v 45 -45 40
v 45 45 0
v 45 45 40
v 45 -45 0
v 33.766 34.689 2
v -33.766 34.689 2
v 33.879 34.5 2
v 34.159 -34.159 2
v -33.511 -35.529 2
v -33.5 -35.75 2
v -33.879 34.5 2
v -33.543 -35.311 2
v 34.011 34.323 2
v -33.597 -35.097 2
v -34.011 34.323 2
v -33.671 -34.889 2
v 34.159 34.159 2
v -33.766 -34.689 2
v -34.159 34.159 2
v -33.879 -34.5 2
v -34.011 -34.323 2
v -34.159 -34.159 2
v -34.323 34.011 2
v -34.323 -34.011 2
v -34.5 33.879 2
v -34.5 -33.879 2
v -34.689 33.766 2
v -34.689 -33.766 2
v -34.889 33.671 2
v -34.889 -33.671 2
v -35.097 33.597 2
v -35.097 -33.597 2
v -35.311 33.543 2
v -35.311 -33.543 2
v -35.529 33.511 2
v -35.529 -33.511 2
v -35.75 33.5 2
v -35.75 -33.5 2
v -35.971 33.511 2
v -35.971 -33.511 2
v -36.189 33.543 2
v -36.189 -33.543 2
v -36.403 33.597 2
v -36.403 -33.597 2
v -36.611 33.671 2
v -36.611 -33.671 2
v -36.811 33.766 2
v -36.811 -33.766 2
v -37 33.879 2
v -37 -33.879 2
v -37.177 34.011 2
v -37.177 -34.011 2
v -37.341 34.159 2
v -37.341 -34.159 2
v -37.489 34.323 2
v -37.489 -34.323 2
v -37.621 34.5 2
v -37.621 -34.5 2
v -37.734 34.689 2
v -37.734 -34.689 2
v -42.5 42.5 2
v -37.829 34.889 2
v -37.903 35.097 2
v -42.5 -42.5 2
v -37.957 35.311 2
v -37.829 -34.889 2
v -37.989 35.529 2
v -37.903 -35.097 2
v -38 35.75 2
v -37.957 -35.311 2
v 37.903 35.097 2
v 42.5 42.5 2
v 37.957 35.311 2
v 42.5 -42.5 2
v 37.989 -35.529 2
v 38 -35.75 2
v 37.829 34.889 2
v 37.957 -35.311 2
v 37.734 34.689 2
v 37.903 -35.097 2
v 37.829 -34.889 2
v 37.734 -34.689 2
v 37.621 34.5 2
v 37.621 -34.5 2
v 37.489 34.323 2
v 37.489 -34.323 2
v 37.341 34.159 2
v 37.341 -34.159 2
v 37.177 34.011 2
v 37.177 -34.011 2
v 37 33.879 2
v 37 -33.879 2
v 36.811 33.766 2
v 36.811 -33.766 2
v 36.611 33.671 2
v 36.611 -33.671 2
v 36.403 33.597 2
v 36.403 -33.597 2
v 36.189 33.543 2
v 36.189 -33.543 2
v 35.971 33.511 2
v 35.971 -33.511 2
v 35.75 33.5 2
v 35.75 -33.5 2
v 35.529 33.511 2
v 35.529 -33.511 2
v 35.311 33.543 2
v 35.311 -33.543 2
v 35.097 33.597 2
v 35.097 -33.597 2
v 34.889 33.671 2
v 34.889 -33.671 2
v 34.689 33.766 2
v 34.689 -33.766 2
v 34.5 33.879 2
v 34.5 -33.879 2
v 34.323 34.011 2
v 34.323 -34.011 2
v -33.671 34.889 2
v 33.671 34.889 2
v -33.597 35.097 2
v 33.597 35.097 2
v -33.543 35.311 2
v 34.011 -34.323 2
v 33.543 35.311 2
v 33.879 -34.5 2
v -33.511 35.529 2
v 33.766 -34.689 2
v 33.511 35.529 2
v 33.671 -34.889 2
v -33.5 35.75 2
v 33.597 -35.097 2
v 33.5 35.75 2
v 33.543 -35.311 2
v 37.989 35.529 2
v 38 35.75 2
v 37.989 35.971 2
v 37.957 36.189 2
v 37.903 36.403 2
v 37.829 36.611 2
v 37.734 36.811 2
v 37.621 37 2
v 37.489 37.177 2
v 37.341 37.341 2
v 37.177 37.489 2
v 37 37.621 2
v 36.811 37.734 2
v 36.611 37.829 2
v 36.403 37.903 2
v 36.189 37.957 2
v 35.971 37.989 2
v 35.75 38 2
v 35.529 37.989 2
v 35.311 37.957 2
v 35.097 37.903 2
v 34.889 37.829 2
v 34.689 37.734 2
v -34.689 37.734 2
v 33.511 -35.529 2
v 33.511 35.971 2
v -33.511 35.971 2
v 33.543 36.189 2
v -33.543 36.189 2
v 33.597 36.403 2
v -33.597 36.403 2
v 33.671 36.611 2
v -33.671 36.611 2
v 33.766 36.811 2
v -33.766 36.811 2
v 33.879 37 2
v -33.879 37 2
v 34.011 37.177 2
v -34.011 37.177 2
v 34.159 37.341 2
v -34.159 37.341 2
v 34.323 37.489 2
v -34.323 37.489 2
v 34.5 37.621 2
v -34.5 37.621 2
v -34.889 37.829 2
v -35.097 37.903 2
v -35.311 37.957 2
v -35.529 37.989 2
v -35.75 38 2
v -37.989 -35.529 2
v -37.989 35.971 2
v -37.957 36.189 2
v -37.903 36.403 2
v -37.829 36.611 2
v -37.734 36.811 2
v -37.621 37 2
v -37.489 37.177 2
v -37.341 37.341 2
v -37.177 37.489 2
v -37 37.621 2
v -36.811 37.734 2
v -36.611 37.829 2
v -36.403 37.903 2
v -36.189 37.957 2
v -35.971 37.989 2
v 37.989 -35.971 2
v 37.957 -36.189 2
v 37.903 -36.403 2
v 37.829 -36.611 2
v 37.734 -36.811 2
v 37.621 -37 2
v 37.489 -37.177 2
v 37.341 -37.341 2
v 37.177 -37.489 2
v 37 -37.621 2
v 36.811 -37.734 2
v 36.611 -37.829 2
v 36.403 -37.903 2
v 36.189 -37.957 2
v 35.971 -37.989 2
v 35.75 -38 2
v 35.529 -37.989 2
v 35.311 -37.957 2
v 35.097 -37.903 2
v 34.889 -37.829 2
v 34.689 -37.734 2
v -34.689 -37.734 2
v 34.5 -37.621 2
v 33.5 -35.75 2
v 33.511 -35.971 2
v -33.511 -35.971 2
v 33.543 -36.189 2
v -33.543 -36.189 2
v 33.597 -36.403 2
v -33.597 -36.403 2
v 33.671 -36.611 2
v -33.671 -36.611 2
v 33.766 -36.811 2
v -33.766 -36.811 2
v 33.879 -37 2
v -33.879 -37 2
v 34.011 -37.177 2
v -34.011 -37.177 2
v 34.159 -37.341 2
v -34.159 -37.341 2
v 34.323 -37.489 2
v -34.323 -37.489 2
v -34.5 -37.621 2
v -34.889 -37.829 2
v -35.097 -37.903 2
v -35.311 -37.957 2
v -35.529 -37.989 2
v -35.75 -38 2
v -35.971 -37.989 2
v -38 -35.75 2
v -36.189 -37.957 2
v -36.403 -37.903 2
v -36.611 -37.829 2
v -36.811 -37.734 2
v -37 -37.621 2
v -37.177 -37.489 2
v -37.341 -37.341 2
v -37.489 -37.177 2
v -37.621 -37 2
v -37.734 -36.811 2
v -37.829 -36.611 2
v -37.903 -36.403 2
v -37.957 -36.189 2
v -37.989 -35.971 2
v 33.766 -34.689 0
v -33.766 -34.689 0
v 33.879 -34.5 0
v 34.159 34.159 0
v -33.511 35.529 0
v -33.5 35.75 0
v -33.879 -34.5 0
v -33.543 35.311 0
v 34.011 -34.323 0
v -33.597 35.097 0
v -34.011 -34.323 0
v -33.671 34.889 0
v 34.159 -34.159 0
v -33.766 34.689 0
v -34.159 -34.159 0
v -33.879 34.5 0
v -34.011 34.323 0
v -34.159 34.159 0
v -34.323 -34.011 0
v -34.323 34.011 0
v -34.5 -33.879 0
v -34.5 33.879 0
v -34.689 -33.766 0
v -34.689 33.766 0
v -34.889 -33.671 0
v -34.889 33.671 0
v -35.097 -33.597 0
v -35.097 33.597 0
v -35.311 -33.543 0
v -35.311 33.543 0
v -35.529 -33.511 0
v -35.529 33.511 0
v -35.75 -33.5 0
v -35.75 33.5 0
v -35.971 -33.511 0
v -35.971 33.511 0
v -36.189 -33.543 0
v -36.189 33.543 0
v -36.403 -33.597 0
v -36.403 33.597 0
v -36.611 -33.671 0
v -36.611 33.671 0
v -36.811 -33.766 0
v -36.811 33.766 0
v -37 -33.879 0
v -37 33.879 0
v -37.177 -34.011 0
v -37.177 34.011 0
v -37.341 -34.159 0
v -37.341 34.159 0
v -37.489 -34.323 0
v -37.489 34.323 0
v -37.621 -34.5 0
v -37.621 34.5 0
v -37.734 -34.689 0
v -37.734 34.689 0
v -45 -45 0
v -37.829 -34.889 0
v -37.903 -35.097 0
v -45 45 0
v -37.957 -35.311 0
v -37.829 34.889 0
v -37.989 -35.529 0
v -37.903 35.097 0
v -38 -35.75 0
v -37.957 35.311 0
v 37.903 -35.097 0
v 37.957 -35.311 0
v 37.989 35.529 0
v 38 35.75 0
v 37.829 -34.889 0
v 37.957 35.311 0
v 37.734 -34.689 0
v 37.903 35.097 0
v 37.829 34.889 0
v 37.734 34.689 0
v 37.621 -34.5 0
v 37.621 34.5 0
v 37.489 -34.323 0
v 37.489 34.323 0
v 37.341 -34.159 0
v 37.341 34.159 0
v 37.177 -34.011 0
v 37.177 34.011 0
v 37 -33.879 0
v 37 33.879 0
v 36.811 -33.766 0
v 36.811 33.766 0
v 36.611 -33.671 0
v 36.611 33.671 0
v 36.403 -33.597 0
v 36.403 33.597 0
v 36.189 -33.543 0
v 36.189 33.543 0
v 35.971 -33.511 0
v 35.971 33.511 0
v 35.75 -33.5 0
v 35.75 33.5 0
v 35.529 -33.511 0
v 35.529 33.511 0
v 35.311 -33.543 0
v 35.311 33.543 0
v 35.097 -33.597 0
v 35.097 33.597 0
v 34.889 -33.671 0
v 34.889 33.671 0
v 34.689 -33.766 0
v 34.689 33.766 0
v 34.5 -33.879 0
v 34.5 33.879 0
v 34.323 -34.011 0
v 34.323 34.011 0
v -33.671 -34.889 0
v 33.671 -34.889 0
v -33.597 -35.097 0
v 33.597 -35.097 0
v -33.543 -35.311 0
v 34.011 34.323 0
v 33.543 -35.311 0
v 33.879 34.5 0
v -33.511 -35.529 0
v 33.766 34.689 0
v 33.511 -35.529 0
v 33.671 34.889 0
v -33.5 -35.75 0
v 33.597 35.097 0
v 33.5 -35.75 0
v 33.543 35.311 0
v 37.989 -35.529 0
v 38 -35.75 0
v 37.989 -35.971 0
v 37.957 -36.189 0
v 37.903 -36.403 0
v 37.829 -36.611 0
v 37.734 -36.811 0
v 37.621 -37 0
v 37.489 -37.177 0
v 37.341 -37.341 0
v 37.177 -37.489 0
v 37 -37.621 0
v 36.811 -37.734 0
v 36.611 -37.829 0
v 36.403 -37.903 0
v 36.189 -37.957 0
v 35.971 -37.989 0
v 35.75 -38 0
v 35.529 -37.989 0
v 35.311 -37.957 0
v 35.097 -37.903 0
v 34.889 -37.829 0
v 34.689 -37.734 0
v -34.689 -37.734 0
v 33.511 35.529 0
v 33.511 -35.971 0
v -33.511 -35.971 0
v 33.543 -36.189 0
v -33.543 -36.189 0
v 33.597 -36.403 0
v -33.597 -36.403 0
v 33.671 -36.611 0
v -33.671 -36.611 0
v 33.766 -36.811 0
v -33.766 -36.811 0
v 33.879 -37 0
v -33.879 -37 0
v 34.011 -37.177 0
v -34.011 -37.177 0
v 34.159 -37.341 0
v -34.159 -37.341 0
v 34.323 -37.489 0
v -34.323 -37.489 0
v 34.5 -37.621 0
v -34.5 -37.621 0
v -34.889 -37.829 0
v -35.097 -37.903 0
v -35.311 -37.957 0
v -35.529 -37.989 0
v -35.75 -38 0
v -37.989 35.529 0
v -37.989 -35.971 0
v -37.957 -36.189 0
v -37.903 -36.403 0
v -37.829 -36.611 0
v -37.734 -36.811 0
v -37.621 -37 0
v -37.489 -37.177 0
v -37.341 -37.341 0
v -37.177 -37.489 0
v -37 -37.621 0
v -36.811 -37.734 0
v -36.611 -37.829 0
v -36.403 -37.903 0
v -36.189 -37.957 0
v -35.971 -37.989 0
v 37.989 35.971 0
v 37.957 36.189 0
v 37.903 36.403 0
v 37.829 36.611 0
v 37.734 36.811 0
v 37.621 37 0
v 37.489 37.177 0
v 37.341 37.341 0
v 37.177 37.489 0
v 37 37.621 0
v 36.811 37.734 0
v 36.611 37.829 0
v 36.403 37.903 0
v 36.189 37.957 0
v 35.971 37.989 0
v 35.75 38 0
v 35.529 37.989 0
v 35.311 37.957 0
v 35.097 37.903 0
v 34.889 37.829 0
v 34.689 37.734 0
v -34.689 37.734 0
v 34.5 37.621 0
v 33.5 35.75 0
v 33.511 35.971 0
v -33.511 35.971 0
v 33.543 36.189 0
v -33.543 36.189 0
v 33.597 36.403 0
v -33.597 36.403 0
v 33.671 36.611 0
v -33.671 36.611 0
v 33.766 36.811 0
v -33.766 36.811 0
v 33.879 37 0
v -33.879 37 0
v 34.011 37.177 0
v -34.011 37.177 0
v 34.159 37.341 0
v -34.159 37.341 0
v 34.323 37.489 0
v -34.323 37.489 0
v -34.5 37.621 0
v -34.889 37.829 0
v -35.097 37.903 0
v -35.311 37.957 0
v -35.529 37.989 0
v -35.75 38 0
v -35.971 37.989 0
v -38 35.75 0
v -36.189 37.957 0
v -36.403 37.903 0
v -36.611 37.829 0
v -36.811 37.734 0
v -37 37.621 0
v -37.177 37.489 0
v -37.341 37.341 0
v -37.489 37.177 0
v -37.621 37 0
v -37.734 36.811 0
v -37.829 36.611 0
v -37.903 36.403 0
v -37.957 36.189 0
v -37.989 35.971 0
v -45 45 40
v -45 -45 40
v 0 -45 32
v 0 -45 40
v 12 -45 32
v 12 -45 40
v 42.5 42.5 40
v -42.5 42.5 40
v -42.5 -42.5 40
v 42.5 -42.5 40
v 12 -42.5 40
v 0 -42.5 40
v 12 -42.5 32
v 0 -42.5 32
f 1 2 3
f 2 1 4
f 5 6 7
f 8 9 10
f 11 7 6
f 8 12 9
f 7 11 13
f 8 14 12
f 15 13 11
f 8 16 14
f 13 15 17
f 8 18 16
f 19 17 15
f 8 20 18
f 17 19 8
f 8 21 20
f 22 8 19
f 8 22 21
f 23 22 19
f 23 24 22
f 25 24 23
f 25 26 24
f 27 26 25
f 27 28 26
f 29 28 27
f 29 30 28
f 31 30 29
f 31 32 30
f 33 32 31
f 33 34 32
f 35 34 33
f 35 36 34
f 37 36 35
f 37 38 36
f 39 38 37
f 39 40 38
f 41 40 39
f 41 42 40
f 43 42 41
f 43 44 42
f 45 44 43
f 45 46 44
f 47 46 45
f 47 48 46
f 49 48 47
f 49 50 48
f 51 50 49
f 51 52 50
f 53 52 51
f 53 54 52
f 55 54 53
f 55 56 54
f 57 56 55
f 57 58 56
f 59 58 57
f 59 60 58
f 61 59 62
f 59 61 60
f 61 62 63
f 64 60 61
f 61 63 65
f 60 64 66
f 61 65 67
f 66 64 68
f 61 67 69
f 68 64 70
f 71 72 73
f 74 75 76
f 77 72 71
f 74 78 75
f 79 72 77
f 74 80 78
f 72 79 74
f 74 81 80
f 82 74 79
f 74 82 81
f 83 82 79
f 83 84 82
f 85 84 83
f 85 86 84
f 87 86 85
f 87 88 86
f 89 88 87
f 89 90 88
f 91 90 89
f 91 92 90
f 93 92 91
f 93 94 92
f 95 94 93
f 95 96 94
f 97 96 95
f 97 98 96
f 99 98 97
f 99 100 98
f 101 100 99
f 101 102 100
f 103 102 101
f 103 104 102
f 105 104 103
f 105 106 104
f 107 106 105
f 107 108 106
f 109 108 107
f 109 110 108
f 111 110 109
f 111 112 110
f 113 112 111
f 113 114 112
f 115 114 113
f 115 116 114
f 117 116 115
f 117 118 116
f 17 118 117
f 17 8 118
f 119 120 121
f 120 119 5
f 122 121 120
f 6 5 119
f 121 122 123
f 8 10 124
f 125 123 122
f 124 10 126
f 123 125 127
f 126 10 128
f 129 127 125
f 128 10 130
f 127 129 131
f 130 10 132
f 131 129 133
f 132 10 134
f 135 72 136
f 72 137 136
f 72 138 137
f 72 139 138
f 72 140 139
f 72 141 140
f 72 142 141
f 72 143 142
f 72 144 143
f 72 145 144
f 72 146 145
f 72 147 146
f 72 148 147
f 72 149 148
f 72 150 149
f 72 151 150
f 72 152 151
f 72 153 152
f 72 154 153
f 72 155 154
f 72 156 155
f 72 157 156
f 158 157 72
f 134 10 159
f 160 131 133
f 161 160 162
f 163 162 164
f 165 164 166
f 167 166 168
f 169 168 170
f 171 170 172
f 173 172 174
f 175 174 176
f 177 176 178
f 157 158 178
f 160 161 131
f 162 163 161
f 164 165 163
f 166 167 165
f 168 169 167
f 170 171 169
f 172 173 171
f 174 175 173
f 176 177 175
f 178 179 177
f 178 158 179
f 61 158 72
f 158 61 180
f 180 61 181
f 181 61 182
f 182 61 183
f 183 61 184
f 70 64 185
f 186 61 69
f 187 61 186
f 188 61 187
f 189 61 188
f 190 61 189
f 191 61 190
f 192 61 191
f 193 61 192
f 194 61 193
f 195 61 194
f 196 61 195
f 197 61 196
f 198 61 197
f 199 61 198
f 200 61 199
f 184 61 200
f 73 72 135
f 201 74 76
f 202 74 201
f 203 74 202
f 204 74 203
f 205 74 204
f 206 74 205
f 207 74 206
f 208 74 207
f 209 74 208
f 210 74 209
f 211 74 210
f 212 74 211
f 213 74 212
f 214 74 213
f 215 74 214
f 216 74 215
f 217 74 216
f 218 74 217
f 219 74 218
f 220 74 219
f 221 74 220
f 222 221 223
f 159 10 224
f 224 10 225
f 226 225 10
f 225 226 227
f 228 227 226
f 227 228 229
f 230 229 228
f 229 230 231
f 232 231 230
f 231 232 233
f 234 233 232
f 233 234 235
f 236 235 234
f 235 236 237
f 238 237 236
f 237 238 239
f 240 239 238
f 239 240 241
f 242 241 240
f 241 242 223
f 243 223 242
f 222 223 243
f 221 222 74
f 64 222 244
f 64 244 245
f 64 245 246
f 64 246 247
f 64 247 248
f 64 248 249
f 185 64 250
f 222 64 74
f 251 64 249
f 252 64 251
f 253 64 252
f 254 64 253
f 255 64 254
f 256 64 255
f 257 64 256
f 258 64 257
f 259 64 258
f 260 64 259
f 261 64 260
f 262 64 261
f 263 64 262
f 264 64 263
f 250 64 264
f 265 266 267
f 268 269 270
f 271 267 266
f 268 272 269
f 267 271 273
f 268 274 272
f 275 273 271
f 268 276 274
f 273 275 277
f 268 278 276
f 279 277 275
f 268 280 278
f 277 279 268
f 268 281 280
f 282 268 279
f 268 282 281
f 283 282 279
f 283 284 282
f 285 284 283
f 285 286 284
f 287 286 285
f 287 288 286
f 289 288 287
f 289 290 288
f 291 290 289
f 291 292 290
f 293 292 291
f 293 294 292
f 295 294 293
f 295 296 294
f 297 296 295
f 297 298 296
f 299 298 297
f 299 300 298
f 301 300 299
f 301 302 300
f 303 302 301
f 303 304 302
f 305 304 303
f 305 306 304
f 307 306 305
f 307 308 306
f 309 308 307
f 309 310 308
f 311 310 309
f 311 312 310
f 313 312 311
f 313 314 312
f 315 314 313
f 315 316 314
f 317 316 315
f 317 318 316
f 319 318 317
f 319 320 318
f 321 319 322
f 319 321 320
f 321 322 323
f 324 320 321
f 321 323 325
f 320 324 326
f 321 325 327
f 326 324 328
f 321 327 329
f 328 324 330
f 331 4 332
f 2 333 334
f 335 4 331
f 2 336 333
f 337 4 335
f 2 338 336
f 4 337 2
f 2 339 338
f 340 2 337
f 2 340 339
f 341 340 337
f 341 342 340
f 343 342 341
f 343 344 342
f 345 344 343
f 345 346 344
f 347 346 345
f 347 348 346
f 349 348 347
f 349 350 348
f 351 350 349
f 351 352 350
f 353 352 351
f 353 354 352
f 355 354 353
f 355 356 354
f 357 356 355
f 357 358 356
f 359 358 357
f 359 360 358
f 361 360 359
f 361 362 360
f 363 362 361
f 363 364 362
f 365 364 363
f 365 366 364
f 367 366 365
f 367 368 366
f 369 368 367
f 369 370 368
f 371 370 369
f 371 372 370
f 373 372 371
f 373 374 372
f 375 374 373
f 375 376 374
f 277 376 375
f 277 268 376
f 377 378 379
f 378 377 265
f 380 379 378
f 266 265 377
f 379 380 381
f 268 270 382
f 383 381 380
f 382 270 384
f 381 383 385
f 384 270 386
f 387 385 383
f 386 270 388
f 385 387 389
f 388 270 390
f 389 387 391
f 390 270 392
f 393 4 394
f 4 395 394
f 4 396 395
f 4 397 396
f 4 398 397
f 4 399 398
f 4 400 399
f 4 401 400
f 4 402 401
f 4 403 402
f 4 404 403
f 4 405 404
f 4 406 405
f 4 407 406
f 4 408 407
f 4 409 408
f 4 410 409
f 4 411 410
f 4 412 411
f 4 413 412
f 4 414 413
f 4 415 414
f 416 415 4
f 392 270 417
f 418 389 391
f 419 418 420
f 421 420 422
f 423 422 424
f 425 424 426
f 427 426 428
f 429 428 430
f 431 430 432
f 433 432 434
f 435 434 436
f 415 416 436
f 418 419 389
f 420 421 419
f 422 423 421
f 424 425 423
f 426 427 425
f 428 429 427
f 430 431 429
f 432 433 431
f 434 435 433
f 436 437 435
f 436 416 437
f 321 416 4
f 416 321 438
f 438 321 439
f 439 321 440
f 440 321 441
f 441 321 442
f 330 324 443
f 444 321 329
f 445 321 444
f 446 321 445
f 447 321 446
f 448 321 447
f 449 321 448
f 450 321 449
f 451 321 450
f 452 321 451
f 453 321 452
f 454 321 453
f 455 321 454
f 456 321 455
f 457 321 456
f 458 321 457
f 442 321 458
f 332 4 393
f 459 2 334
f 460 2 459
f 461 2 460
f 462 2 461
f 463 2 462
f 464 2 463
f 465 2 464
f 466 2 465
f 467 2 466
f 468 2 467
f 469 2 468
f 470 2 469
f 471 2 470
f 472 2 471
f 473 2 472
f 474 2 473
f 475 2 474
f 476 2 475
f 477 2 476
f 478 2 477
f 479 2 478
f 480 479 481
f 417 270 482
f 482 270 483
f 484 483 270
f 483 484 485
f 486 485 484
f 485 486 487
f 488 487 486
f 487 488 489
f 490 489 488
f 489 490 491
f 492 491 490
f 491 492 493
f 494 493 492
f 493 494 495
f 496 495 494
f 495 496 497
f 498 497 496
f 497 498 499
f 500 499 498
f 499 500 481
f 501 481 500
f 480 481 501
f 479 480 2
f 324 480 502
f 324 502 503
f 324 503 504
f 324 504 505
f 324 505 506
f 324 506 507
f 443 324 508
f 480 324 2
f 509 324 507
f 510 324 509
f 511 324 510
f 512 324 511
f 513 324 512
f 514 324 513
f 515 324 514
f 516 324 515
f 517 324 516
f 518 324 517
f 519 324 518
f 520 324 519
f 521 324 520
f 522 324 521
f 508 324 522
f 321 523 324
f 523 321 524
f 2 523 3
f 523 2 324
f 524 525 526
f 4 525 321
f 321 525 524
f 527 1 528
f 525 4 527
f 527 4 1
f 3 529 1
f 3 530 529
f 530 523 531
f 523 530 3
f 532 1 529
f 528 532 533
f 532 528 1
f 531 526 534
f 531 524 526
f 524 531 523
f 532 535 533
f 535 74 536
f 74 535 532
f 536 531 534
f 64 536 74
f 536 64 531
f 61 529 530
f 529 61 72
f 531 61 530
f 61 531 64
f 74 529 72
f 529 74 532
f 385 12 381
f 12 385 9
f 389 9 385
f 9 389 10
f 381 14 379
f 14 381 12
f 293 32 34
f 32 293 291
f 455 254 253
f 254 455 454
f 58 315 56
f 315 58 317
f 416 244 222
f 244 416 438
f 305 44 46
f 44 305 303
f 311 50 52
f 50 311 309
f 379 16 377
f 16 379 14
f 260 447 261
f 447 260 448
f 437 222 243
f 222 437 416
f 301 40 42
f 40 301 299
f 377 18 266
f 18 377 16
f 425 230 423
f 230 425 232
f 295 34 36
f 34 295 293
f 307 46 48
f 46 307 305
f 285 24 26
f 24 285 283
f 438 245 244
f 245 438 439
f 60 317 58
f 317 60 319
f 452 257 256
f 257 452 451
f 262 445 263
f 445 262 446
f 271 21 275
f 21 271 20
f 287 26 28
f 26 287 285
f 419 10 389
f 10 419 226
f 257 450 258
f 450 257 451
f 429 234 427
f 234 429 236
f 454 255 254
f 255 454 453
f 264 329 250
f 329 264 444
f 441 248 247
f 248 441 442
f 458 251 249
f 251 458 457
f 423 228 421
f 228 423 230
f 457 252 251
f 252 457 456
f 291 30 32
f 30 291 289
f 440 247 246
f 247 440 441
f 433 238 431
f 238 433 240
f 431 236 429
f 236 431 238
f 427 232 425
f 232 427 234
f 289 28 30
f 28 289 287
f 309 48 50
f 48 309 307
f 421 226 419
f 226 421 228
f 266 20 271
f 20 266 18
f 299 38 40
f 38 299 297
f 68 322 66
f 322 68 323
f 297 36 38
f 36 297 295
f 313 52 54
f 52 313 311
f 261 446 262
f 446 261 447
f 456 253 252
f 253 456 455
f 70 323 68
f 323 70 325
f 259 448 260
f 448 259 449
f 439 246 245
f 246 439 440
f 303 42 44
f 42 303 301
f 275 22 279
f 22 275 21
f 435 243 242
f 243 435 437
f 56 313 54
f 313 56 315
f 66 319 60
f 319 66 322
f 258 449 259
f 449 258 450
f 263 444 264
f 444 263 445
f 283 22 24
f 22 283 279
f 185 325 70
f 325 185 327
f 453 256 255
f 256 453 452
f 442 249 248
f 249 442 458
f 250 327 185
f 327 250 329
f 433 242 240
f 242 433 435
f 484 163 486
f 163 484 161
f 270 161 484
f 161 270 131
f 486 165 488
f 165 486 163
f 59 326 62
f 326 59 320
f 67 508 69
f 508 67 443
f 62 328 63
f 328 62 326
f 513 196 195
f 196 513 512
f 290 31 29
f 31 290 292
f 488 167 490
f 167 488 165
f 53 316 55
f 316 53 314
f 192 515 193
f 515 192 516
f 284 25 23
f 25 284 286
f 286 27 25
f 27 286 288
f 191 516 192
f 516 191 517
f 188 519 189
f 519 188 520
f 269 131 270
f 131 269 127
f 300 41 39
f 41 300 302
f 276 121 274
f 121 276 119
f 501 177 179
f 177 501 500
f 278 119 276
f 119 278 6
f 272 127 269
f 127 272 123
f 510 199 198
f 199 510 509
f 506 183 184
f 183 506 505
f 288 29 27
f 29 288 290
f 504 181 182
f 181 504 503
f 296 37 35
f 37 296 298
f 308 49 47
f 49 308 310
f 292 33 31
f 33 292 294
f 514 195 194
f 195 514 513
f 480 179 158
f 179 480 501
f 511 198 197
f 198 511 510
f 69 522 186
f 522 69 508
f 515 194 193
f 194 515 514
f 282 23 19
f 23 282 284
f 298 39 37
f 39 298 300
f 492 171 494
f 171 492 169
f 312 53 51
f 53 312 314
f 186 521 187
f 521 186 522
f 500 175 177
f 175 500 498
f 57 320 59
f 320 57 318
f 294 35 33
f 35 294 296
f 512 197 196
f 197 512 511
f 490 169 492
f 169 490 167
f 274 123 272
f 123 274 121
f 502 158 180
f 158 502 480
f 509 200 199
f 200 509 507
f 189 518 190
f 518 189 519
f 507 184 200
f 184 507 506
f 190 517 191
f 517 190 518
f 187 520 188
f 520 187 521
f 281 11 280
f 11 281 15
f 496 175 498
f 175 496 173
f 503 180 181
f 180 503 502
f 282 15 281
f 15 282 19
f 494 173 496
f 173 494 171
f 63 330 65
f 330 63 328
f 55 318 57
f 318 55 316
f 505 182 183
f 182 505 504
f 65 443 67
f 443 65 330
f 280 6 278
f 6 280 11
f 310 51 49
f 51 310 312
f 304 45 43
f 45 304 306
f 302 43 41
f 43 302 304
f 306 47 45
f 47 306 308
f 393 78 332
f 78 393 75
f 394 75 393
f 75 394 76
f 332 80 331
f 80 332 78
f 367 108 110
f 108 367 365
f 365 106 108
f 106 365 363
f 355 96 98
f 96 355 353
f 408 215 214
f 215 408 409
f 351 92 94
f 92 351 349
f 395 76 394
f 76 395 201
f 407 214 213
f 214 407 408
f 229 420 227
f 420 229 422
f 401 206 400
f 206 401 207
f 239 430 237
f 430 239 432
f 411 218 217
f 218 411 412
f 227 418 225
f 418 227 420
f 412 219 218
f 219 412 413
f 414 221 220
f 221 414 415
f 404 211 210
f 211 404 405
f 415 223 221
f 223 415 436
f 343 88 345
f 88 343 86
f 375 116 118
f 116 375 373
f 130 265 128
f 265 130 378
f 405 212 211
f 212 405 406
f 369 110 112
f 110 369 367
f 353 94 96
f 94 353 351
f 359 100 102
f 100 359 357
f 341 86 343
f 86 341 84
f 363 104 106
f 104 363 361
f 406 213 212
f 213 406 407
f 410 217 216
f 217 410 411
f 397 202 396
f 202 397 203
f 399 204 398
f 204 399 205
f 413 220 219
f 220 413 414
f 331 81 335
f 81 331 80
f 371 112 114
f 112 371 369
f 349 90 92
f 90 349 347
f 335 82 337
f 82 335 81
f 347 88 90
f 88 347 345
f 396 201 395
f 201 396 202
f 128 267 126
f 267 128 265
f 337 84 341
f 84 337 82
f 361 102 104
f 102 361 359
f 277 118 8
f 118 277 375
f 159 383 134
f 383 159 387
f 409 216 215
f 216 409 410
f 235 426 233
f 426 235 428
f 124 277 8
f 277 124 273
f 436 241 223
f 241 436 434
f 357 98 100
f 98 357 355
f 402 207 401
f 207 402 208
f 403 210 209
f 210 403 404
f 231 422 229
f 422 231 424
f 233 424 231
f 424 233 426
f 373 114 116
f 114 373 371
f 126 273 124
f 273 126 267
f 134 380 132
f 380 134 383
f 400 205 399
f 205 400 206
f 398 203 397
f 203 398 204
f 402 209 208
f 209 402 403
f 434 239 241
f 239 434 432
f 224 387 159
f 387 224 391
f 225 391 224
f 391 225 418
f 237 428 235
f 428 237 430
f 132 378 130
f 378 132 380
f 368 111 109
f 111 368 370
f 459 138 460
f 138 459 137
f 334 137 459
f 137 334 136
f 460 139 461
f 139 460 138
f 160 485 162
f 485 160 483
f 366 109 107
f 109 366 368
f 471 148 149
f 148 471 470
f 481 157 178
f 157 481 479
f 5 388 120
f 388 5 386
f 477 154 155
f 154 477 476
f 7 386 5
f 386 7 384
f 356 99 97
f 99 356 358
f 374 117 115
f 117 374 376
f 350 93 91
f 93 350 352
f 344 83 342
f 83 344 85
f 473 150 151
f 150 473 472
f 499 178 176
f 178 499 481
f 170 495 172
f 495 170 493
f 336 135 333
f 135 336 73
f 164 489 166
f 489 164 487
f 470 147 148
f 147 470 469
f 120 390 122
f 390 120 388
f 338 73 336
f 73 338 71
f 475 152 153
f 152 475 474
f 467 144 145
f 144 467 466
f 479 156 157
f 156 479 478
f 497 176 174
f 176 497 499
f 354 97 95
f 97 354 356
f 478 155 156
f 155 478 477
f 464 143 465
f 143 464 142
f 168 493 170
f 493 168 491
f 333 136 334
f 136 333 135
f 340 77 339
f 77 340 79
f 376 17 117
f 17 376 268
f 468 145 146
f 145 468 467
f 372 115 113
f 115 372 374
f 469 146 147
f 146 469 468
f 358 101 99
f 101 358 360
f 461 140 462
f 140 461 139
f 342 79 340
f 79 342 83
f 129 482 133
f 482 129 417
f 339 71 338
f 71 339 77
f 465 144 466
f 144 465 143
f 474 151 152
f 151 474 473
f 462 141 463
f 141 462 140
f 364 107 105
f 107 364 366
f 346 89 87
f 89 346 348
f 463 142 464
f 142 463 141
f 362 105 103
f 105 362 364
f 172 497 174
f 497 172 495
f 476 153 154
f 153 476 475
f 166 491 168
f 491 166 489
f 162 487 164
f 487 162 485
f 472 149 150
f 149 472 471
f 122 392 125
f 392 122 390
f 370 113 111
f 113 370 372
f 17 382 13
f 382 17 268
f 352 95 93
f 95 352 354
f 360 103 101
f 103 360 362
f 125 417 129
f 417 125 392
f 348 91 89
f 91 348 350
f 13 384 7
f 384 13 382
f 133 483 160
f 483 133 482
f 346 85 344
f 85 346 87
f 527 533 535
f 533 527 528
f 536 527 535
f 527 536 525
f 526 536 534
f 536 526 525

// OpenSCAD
// DIY magnetic stirrer housing for an 80 mm PC case fan.
// Modelled in print orientation: the 2 mm top plate (stirring surface)
// lies flat on the bed (z = 0..2) and the four 2.5 mm walls rise to z = 40,
// leaving the box open at the top.

// ---- Dimensions (mm) ----
outer_x   = 90;   // outer size along X
outer_y   = 90;   // outer size along Y
wall_t    = 2.5;  // wall thickness
top_t     = 2;    // top plate thickness (stirring surface)
wall_h    = 38;   // wall height above the top plate (2 + 38 = 40 total)
wall_top  = top_t + wall_h;  // open edge height = 40

hole_d    = 4.5;  // M4 clearance hole diameter
hole_pitch= 71.5; // square pitch of the four mounting holes (centred)

notch_w   = 12;   // power-cable notch width
notch_top = 40;   // notch reaches the open edge
notch_bot = 32;   // notch bottom (8 mm down from the open edge)

$fn = 64;         // smooth round holes

// ---- Base: top plate + four walls (open box, printed upside down) ----
module base() { union() {
    // top plate on the bed
    translate([-outer_x/2, -outer_y/2, 0])
        cube([outer_x, outer_y, top_t]);

    // four walls rising from the top plate
    // front wall (negative Y side)
    translate([-outer_x/2, -outer_y/2, top_t])
        cube([outer_x, wall_t, wall_h]);
    // back wall (positive Y side)
    translate([-outer_x/2, outer_y/2 - wall_t, top_t])
        cube([outer_x, wall_t, wall_h]);
    // left wall (negative X side)
    translate([-outer_x/2, -outer_y/2 + wall_t, top_t])
        cube([wall_t, outer_y - 2*wall_t, wall_h]);
    // right wall (positive X side)
    translate([outer_x/2 - wall_t, -outer_y/2 + wall_t, top_t])
        cube([wall_t, outer_y - 2*wall_t, wall_h]);
} }

// ---- Cutters ----
// four M4 mounting holes through the top plate (71.5 mm square, centred)
module mounting_holes() { for (dx = [-hole_pitch/2, hole_pitch/2],
                      dy = [-hole_pitch/2, hole_pitch/2])
    translate([dx, dy, -1])
        cylinder(h = top_t + 2, r = hole_d/2, $fn = $fn); }

// power-cable notch in one wall (front wall, centred along it)
// extended 1 mm past the open edge so it cuts fully through the wall
module cable_notch() { translate([0, -outer_y/2 - 1, notch_bot])
    cube([notch_w, wall_t + 2, (notch_top + 1) - notch_bot]); }

// ---- Final part ----
difference() {
    base();
    mounting_holes();
    cable_notch();
}
